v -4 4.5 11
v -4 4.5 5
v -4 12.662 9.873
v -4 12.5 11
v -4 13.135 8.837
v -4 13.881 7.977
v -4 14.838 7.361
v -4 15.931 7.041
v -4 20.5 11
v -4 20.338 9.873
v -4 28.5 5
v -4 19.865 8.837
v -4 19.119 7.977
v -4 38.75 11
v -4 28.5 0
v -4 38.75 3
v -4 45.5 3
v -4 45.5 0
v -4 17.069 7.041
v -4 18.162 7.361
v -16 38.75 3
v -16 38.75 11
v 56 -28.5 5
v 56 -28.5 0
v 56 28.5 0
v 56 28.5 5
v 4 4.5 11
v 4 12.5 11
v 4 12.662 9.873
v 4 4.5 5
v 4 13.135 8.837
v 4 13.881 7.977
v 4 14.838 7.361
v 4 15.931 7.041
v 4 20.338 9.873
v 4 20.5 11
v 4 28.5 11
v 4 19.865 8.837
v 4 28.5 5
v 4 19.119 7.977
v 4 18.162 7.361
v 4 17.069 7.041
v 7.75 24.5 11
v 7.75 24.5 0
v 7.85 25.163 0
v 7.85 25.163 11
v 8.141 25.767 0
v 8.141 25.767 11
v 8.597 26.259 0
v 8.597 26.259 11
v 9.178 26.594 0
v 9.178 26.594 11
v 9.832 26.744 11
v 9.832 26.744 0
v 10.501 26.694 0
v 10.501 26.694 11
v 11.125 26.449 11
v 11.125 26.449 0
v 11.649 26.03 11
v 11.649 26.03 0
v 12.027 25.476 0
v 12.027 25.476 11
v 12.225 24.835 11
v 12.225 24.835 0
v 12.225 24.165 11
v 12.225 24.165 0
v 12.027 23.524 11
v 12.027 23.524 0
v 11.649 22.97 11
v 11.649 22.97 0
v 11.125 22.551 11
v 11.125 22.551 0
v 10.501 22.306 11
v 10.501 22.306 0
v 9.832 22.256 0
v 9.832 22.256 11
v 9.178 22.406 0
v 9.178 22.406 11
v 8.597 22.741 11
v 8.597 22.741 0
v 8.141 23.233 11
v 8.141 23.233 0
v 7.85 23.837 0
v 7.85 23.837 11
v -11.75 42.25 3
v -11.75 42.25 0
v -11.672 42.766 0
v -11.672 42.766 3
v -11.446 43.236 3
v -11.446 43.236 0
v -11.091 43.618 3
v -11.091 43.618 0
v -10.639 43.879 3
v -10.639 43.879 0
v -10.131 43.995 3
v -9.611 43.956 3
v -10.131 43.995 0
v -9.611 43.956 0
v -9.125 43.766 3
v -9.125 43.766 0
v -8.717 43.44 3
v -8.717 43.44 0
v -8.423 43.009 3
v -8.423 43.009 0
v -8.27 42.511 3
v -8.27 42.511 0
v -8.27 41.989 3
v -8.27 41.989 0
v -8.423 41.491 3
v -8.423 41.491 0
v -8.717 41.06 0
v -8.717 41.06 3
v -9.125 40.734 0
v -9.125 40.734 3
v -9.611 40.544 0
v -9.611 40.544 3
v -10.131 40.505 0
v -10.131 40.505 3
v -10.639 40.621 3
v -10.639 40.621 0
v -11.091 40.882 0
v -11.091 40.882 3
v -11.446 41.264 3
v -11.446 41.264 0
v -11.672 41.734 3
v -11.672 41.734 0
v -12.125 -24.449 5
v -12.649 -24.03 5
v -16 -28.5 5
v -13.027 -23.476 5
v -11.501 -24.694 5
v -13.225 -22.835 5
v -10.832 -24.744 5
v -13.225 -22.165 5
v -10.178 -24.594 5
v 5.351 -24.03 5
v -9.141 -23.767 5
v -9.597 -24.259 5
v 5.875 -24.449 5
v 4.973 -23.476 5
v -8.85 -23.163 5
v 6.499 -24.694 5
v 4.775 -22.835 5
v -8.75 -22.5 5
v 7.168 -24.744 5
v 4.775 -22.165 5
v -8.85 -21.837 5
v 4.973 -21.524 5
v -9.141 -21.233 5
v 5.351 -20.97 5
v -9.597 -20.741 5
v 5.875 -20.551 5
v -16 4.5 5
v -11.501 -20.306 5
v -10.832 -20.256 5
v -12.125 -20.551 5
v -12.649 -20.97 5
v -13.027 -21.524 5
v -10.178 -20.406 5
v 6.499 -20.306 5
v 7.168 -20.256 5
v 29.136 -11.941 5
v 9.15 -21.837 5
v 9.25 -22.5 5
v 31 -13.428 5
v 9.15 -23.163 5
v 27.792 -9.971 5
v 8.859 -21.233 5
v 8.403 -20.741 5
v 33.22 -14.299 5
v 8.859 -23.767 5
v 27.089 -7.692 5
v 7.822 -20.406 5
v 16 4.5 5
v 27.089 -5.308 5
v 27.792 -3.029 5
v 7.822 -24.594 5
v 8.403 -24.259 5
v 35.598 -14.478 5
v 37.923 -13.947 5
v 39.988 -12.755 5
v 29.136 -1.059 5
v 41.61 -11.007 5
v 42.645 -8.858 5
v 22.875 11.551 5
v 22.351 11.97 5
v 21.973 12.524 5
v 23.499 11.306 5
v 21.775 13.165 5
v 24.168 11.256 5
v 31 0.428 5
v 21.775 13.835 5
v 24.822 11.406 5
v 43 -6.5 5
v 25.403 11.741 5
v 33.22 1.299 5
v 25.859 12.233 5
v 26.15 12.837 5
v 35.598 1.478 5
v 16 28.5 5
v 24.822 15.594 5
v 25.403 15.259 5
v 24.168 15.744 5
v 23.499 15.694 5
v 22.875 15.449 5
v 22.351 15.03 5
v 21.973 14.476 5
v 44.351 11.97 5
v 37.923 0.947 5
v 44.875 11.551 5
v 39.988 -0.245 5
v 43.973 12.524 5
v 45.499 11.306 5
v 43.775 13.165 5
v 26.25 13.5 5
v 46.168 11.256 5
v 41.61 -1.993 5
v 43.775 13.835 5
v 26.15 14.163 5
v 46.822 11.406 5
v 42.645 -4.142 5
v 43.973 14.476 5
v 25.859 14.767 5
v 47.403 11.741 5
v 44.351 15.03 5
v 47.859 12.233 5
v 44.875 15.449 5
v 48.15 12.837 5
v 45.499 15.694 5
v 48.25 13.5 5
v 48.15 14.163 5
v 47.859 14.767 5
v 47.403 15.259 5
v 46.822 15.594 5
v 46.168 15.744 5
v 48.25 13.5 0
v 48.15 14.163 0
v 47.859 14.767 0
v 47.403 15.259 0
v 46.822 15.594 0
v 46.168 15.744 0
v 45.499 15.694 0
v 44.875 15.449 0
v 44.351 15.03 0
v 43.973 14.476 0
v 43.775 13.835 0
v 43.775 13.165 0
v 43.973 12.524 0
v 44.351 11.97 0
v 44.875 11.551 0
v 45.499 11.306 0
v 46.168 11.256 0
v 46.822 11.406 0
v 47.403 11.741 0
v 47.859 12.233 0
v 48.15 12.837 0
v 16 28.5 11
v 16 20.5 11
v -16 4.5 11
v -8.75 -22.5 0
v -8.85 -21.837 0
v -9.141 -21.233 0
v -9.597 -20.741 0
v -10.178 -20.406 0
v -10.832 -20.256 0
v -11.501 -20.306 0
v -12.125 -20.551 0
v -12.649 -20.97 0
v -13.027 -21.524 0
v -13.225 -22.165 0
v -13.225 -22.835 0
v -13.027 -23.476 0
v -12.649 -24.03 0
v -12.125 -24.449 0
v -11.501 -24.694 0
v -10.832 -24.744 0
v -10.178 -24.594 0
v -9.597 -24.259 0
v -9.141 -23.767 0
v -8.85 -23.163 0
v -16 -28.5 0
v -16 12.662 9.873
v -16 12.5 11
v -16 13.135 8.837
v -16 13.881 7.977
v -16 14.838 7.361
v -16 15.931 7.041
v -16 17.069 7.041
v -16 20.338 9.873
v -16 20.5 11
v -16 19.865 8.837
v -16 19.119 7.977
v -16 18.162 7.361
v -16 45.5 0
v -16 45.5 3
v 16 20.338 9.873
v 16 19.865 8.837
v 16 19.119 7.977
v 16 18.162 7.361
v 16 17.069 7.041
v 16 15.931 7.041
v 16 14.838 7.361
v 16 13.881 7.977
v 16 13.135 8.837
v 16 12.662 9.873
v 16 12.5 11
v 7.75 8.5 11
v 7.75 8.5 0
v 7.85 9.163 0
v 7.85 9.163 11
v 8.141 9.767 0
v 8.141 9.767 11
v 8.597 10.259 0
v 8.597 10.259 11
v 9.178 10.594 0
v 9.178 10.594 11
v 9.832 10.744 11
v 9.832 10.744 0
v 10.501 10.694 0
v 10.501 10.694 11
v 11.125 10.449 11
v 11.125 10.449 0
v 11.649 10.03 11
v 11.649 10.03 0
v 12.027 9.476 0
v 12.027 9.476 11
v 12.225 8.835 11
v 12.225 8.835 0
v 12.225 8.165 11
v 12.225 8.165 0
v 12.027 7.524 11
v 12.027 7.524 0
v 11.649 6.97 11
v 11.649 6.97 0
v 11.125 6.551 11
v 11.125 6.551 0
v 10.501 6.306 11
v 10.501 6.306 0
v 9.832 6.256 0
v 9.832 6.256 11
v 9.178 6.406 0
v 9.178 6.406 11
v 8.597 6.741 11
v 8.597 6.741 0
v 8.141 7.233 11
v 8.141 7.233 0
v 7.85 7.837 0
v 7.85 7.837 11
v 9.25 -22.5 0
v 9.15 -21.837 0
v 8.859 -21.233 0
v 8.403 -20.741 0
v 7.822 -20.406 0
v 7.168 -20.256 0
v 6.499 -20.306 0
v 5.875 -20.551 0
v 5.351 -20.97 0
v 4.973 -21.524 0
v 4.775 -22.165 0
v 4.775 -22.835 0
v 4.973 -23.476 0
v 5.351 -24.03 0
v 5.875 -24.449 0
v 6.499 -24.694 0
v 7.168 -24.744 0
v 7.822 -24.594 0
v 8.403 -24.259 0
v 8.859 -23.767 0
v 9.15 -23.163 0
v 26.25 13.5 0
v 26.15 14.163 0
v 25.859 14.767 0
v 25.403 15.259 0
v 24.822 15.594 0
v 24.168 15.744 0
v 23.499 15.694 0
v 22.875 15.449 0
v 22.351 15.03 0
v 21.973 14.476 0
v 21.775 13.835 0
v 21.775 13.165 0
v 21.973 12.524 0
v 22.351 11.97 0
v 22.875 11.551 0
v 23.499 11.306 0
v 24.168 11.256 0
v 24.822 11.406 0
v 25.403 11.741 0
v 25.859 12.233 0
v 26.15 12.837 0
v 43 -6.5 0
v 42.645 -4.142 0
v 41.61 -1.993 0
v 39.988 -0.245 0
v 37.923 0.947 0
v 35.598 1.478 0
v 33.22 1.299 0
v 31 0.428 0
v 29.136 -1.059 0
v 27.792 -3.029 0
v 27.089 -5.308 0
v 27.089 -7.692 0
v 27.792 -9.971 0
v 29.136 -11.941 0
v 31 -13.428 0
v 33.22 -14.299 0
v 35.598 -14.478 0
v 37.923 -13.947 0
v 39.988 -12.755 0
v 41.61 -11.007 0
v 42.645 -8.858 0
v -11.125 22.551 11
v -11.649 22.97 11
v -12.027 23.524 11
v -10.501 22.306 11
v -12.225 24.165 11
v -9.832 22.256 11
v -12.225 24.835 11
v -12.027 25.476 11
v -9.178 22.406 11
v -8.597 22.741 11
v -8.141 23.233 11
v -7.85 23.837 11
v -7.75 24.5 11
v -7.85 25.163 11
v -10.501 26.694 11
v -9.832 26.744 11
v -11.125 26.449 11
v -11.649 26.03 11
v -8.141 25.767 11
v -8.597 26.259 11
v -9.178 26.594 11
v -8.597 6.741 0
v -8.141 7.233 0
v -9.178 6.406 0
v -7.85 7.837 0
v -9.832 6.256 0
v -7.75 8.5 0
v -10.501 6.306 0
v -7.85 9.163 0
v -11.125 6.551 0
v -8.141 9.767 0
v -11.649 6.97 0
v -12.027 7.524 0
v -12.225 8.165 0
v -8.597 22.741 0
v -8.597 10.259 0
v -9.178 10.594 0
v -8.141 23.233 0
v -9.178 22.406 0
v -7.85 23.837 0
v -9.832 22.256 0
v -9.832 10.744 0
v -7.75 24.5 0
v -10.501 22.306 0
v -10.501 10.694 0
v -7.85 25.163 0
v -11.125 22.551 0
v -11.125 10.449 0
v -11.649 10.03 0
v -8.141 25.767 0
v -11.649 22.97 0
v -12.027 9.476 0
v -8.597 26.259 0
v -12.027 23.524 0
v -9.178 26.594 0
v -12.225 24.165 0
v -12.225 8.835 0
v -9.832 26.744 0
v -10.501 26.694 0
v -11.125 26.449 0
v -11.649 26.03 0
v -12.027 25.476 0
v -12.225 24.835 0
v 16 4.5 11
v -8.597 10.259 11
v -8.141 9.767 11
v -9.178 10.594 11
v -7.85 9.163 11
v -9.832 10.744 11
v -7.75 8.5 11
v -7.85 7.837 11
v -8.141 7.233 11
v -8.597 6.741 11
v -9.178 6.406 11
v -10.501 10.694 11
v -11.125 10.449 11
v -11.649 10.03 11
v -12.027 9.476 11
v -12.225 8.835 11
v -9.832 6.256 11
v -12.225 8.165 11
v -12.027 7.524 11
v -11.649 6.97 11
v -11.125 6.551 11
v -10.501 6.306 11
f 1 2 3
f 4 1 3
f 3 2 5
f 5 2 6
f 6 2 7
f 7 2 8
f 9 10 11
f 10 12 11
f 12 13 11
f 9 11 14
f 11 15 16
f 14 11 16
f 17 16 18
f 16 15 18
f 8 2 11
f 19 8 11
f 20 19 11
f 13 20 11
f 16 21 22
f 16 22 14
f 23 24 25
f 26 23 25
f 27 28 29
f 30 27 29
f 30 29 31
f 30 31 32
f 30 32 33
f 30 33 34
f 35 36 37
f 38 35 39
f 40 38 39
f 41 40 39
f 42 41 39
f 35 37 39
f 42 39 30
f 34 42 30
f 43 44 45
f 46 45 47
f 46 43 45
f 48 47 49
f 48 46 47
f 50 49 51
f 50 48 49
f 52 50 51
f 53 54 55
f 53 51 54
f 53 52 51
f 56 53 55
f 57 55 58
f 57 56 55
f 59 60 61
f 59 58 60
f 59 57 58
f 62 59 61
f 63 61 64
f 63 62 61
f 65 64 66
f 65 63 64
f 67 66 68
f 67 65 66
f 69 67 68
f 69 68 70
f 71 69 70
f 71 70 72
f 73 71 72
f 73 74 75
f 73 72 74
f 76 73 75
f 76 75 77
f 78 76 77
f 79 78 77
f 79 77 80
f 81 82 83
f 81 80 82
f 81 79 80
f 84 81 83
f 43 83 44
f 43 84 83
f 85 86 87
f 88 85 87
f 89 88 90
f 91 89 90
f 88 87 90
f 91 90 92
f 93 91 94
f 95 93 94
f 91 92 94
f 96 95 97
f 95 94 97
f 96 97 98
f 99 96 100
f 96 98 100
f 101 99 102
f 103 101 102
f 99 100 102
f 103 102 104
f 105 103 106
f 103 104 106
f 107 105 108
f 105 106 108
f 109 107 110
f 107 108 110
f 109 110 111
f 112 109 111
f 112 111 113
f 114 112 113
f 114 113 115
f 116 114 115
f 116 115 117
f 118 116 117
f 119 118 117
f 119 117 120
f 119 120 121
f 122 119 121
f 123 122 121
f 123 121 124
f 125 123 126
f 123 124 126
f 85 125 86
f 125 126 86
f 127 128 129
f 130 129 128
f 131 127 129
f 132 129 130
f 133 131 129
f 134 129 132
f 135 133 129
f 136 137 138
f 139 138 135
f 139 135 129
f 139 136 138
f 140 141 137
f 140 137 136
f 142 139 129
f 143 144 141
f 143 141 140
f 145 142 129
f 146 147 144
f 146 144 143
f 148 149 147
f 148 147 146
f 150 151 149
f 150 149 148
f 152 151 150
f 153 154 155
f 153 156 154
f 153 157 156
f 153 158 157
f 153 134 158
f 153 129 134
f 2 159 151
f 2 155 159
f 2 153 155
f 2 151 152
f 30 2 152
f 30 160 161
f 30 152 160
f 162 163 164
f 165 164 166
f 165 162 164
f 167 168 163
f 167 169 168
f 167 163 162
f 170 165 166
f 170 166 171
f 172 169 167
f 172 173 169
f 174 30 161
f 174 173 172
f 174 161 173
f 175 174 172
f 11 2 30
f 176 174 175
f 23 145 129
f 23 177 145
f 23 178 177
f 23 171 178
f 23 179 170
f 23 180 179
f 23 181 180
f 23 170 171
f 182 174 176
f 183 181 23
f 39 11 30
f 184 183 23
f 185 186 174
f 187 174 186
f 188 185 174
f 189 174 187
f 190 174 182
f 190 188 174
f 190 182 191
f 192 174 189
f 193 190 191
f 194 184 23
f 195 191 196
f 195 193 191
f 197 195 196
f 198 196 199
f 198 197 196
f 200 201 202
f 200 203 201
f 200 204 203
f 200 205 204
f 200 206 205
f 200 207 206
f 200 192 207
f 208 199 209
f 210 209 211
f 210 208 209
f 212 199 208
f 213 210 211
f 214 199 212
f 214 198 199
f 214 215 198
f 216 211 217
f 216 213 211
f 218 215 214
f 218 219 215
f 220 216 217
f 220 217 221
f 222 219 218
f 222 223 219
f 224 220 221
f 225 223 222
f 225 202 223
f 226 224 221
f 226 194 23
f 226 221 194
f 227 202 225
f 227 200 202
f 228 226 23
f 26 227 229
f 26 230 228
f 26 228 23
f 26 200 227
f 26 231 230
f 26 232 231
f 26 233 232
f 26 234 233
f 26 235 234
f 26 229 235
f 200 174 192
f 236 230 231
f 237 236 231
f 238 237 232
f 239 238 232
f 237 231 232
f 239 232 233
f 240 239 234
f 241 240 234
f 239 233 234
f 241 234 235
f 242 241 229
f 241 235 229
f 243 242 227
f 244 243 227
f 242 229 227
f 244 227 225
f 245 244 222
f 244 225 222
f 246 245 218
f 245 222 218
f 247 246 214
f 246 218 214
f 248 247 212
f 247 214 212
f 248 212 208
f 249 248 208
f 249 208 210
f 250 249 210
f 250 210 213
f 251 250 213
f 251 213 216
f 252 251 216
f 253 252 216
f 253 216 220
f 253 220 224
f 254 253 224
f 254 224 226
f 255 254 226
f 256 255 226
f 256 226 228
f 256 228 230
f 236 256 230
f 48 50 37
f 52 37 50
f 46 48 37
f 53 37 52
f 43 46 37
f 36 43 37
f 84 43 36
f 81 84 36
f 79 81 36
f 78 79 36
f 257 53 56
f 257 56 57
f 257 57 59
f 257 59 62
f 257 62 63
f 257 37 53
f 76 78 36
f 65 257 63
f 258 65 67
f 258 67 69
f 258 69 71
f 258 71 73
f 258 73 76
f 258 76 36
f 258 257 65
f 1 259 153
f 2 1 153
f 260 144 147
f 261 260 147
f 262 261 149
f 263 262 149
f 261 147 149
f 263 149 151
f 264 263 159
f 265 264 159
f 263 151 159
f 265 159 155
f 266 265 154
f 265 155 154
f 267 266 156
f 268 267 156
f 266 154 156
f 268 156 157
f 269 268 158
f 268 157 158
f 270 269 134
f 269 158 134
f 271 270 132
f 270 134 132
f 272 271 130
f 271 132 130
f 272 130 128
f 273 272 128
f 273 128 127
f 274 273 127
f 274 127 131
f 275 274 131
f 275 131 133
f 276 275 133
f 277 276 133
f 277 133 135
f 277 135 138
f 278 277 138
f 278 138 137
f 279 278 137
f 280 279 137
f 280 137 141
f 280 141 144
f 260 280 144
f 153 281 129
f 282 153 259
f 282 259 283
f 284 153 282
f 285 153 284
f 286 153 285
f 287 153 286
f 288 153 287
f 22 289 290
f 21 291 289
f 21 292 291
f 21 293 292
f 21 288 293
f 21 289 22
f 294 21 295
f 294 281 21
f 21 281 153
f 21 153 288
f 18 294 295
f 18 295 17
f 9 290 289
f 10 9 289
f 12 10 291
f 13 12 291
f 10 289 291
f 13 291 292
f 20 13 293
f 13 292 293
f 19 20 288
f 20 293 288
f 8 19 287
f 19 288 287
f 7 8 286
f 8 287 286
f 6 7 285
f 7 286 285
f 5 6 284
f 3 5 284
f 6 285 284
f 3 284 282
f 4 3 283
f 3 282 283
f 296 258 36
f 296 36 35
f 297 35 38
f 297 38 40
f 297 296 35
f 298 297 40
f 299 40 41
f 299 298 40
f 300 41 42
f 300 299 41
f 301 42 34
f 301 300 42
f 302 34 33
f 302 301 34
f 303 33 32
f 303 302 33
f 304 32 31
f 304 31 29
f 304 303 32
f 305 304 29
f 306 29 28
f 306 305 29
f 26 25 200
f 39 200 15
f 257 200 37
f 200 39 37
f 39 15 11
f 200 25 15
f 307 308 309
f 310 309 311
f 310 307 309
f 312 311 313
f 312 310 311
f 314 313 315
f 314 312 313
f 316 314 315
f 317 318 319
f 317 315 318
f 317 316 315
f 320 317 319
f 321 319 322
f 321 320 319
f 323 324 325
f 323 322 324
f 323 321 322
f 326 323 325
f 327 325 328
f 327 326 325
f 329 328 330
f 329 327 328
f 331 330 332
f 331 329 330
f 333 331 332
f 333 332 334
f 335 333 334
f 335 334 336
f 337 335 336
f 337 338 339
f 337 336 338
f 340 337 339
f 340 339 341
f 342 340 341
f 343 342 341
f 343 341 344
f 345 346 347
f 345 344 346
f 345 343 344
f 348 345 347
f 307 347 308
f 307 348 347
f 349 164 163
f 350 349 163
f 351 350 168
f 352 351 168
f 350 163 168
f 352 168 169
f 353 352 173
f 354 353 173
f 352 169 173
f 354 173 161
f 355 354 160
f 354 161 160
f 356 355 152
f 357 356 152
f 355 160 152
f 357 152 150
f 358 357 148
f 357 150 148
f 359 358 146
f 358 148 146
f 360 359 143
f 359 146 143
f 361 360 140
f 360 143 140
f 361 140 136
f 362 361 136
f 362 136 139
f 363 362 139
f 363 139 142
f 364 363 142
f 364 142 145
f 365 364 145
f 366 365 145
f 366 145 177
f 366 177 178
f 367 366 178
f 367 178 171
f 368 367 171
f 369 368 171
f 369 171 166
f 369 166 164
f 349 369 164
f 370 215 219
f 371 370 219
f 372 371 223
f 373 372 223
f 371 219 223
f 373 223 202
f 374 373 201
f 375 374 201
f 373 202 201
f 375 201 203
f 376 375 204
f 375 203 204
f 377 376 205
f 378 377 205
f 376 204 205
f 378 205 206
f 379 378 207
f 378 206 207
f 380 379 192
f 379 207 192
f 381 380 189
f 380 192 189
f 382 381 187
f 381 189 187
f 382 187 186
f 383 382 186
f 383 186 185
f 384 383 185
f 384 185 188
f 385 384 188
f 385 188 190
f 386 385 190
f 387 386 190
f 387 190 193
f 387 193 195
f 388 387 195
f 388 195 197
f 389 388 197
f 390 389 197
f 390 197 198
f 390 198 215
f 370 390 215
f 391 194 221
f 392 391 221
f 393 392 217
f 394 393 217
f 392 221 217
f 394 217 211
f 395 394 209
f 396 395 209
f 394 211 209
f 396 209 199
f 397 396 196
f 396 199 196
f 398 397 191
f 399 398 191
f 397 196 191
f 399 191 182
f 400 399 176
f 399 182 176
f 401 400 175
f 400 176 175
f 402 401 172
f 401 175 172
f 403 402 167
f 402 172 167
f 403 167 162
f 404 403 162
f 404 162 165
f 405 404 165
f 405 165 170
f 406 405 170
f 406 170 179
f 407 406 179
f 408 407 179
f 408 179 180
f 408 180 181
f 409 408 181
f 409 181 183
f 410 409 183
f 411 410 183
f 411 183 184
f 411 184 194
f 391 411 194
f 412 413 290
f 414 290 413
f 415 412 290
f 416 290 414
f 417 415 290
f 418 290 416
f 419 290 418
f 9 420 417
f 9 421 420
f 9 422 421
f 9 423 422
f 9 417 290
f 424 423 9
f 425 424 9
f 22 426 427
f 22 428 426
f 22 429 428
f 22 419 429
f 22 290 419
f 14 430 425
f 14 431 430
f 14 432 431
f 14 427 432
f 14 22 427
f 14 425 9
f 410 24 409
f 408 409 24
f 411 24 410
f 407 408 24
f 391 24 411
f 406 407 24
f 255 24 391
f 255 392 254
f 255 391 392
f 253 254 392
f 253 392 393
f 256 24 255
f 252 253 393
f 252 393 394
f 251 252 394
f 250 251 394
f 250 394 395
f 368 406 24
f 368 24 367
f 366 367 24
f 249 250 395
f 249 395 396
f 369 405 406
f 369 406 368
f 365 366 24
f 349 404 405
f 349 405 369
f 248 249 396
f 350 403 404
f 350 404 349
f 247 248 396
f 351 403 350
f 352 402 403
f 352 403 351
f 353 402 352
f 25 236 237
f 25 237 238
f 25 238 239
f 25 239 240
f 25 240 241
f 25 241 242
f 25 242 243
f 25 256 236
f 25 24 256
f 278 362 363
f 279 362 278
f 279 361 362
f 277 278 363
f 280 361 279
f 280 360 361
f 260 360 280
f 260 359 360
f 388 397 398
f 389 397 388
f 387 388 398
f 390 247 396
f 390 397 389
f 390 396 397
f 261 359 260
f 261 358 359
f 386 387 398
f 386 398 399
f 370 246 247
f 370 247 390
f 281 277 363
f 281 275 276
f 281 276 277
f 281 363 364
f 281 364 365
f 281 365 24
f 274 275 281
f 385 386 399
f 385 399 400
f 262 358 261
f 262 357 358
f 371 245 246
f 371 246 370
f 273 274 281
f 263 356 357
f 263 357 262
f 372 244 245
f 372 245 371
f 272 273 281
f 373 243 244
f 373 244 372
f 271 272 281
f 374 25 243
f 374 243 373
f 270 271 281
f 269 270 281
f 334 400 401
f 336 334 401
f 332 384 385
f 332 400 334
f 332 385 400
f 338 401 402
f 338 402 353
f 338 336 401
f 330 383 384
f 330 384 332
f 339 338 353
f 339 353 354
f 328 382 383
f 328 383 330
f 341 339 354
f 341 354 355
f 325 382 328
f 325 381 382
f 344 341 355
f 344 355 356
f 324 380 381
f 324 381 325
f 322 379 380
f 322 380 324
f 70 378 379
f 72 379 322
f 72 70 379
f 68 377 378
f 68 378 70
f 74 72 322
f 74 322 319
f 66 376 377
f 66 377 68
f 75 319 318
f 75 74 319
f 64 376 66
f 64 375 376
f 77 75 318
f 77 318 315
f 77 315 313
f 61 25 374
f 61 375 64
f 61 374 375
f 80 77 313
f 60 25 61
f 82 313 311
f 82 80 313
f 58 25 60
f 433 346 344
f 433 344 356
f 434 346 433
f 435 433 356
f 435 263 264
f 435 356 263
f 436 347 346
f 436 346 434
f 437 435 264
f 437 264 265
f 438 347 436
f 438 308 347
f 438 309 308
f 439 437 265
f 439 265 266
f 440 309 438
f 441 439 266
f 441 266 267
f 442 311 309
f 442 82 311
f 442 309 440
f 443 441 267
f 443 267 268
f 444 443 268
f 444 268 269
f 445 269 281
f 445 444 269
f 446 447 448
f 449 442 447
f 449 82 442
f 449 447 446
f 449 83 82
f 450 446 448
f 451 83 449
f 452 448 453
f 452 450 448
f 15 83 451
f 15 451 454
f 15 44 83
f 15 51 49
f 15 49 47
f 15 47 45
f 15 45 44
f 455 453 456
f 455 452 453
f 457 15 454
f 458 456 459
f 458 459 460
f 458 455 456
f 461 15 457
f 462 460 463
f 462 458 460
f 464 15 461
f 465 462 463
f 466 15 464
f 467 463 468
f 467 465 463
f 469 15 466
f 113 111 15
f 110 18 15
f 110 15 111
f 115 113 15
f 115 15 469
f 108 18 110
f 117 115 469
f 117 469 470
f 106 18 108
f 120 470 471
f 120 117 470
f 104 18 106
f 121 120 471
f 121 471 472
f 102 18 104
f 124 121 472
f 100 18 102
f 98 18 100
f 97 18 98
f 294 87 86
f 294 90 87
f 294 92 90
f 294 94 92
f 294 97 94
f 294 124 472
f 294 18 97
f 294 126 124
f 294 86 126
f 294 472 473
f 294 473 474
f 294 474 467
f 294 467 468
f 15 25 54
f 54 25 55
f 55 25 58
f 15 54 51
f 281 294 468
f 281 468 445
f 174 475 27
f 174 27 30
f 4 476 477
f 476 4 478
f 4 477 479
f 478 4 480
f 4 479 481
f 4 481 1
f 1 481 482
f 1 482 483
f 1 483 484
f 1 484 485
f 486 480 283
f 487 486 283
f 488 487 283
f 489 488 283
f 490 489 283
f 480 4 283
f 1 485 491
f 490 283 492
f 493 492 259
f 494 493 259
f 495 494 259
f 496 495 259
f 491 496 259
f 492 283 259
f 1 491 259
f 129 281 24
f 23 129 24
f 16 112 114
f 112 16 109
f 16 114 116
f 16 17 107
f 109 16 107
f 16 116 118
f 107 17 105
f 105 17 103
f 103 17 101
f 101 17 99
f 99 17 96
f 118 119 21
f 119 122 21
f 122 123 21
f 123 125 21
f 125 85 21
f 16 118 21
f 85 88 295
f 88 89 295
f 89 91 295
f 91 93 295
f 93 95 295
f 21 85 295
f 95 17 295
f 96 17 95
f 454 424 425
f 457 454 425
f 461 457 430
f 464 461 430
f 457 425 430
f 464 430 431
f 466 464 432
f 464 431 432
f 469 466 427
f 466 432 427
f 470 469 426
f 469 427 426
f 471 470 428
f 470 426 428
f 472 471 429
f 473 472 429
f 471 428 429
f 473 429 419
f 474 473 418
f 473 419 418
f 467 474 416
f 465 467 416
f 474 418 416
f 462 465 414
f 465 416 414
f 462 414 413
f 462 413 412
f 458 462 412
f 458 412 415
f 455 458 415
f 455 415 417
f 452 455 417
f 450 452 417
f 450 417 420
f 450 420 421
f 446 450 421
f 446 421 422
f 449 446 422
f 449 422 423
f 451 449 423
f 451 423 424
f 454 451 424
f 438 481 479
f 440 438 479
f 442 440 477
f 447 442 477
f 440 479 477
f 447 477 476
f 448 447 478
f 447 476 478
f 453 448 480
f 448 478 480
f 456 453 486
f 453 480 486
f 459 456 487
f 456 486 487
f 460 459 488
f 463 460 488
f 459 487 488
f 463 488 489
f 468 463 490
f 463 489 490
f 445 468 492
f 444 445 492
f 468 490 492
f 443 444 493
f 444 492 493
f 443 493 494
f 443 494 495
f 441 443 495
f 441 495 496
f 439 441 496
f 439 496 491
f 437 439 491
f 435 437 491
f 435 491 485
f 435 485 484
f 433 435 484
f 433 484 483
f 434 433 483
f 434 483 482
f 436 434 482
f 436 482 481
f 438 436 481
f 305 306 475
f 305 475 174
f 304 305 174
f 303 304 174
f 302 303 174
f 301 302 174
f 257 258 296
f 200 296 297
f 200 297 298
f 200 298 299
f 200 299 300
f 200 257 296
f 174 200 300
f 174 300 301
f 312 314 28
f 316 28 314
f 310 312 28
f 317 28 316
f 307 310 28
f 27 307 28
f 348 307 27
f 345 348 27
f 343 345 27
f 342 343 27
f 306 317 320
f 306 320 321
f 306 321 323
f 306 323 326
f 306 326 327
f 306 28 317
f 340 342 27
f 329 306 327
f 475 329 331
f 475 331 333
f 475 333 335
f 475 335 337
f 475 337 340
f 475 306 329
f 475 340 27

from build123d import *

# Parameters (mm, degrees)
SKETCH1_W           = 72
SKETCH1_H           = 57
BOSS_EXTRUDE1_DEPTH = 5
BOSS_EXTRUDE2_DEPTH = 12
SKETCH5_R           = 2.25
CUT_EXTRUDE2_DEPTH  = 64.790673299
SKETCH4_R           = 8
CUT_EXTRUDE1_DEPTH  = 64.120915709
SKETCH6_R           = 2.25
CUT_EXTRUDE3_DEPTH  = 64.120915709
SKETCH7_R           = 2.25
CUT_EXTRUDE4_DEPTH  = 64.120915709
SKETCH8_R           = 1.75
BOSS_EXTRUDE3_DEPTH = 3
SKETCH9_W           = 12
SKETCH9_H           = 10.25
BOSS_EXTRUDE4_DEPTH = 8


with BuildPart() as part:
    # Sketch1 → Boss-Extrude1 (new body)
    with BuildSketch(Plane.XY):
        with Locations((20, 0)):
            Rectangle(SKETCH1_W, SKETCH1_H)
    extrude(amount=BOSS_EXTRUDE1_DEPTH)

    # Sketch3 → Boss-Extrude2 (add)
    with BuildSketch(Plane(origin=(-16, 0, 0), x_dir=(0, 0, -1), z_dir=(1, 0, 0))):
        with BuildLine():
            Line((-5, 28.5), (-11, 28.5))
            Line((-11, 28.5), (-11, 20.5))
            ThreePointArc((-11, 20.5), (-7, 16.5), (-11, 12.5))
            Line((-11, 12.5), (-11, 4.5))
            Line((-11, 4.5), (-5, 4.5))
            Line((-5, 4.5), (-5, 28.5))
        make_face()
    boss_extrude2 = extrude(amount=BOSS_EXTRUDE2_DEPTH)

    # Sketch5 → Cut-Extrude2 (cut, through all)
    with BuildSketch(Plane.XY.offset(11)):
        with Locations((-10, 24.5)):
            Circle(SKETCH5_R)
        with Locations((-10, 8.5)):
            Circle(SKETCH5_R)
    cut_extrude2 = extrude(amount=-CUT_EXTRUDE2_DEPTH, mode=Mode.SUBTRACT)

    # Mirror1: Boss-Extrude2, Cut-Extrude2 across plane
    add(boss_extrude2.mirror(Plane(origin=(0, 0, 0), x_dir=(0, 0, 1), z_dir=(1, 0, 0))))
    add(cut_extrude2.mirror(Plane(origin=(0, 0, 0), x_dir=(0, 0, 1), z_dir=(1, 0, 0))), mode=Mode.SUBTRACT)

    # Sketch4 → Cut-Extrude1 (cut, through all)
    with BuildSketch(Plane.XY.offset(5)):
        with Locations((35, -6.5)):
            Circle(SKETCH4_R)
    extrude(amount=-CUT_EXTRUDE1_DEPTH, mode=Mode.SUBTRACT)

    # Sketch6 → Cut-Extrude3 (cut, through all)
    with BuildSketch(Plane.XY.offset(5)):
        with Locations((-11, -22.5)):
            Circle(SKETCH6_R)
        with Locations((7, -22.5)):
            Circle(SKETCH6_R)
    extrude(amount=-CUT_EXTRUDE3_DEPTH, mode=Mode.SUBTRACT)

    # Sketch7 → Cut-Extrude4 (cut, through all)
    with BuildSketch(Plane.XY.offset(5)):
        with Locations((46, 13.5)):
            Circle(SKETCH7_R)
        with Locations((24, 13.5)):
            Circle(SKETCH7_R)
    extrude(amount=-CUT_EXTRUDE4_DEPTH, mode=Mode.SUBTRACT)

    # Sketch8 → Boss-Extrude3 (add)
    with BuildSketch(Plane(origin=(0, 0, 0), x_dir=(-1, 0, 0), z_dir=(0, 0, -1))):
        Polygon((16, 39), (16, 45.5), (4, 45.5), (4, 39), (4, 28.5), (16, 28.5), align=None)
        with Locations((10, 42.25)):
            Circle(SKETCH8_R, mode=Mode.SUBTRACT)
    extrude(amount=-BOSS_EXTRUDE3_DEPTH)

    # Sketch9 → Boss-Extrude4 (add)
    with BuildSketch(Plane.XY.offset(3)):
        with Locations((-10, 33.625)):
            Rectangle(SKETCH9_W, SKETCH9_H)
    extrude(amount=BOSS_EXTRUDE4_DEPTH)


solid = part.part
